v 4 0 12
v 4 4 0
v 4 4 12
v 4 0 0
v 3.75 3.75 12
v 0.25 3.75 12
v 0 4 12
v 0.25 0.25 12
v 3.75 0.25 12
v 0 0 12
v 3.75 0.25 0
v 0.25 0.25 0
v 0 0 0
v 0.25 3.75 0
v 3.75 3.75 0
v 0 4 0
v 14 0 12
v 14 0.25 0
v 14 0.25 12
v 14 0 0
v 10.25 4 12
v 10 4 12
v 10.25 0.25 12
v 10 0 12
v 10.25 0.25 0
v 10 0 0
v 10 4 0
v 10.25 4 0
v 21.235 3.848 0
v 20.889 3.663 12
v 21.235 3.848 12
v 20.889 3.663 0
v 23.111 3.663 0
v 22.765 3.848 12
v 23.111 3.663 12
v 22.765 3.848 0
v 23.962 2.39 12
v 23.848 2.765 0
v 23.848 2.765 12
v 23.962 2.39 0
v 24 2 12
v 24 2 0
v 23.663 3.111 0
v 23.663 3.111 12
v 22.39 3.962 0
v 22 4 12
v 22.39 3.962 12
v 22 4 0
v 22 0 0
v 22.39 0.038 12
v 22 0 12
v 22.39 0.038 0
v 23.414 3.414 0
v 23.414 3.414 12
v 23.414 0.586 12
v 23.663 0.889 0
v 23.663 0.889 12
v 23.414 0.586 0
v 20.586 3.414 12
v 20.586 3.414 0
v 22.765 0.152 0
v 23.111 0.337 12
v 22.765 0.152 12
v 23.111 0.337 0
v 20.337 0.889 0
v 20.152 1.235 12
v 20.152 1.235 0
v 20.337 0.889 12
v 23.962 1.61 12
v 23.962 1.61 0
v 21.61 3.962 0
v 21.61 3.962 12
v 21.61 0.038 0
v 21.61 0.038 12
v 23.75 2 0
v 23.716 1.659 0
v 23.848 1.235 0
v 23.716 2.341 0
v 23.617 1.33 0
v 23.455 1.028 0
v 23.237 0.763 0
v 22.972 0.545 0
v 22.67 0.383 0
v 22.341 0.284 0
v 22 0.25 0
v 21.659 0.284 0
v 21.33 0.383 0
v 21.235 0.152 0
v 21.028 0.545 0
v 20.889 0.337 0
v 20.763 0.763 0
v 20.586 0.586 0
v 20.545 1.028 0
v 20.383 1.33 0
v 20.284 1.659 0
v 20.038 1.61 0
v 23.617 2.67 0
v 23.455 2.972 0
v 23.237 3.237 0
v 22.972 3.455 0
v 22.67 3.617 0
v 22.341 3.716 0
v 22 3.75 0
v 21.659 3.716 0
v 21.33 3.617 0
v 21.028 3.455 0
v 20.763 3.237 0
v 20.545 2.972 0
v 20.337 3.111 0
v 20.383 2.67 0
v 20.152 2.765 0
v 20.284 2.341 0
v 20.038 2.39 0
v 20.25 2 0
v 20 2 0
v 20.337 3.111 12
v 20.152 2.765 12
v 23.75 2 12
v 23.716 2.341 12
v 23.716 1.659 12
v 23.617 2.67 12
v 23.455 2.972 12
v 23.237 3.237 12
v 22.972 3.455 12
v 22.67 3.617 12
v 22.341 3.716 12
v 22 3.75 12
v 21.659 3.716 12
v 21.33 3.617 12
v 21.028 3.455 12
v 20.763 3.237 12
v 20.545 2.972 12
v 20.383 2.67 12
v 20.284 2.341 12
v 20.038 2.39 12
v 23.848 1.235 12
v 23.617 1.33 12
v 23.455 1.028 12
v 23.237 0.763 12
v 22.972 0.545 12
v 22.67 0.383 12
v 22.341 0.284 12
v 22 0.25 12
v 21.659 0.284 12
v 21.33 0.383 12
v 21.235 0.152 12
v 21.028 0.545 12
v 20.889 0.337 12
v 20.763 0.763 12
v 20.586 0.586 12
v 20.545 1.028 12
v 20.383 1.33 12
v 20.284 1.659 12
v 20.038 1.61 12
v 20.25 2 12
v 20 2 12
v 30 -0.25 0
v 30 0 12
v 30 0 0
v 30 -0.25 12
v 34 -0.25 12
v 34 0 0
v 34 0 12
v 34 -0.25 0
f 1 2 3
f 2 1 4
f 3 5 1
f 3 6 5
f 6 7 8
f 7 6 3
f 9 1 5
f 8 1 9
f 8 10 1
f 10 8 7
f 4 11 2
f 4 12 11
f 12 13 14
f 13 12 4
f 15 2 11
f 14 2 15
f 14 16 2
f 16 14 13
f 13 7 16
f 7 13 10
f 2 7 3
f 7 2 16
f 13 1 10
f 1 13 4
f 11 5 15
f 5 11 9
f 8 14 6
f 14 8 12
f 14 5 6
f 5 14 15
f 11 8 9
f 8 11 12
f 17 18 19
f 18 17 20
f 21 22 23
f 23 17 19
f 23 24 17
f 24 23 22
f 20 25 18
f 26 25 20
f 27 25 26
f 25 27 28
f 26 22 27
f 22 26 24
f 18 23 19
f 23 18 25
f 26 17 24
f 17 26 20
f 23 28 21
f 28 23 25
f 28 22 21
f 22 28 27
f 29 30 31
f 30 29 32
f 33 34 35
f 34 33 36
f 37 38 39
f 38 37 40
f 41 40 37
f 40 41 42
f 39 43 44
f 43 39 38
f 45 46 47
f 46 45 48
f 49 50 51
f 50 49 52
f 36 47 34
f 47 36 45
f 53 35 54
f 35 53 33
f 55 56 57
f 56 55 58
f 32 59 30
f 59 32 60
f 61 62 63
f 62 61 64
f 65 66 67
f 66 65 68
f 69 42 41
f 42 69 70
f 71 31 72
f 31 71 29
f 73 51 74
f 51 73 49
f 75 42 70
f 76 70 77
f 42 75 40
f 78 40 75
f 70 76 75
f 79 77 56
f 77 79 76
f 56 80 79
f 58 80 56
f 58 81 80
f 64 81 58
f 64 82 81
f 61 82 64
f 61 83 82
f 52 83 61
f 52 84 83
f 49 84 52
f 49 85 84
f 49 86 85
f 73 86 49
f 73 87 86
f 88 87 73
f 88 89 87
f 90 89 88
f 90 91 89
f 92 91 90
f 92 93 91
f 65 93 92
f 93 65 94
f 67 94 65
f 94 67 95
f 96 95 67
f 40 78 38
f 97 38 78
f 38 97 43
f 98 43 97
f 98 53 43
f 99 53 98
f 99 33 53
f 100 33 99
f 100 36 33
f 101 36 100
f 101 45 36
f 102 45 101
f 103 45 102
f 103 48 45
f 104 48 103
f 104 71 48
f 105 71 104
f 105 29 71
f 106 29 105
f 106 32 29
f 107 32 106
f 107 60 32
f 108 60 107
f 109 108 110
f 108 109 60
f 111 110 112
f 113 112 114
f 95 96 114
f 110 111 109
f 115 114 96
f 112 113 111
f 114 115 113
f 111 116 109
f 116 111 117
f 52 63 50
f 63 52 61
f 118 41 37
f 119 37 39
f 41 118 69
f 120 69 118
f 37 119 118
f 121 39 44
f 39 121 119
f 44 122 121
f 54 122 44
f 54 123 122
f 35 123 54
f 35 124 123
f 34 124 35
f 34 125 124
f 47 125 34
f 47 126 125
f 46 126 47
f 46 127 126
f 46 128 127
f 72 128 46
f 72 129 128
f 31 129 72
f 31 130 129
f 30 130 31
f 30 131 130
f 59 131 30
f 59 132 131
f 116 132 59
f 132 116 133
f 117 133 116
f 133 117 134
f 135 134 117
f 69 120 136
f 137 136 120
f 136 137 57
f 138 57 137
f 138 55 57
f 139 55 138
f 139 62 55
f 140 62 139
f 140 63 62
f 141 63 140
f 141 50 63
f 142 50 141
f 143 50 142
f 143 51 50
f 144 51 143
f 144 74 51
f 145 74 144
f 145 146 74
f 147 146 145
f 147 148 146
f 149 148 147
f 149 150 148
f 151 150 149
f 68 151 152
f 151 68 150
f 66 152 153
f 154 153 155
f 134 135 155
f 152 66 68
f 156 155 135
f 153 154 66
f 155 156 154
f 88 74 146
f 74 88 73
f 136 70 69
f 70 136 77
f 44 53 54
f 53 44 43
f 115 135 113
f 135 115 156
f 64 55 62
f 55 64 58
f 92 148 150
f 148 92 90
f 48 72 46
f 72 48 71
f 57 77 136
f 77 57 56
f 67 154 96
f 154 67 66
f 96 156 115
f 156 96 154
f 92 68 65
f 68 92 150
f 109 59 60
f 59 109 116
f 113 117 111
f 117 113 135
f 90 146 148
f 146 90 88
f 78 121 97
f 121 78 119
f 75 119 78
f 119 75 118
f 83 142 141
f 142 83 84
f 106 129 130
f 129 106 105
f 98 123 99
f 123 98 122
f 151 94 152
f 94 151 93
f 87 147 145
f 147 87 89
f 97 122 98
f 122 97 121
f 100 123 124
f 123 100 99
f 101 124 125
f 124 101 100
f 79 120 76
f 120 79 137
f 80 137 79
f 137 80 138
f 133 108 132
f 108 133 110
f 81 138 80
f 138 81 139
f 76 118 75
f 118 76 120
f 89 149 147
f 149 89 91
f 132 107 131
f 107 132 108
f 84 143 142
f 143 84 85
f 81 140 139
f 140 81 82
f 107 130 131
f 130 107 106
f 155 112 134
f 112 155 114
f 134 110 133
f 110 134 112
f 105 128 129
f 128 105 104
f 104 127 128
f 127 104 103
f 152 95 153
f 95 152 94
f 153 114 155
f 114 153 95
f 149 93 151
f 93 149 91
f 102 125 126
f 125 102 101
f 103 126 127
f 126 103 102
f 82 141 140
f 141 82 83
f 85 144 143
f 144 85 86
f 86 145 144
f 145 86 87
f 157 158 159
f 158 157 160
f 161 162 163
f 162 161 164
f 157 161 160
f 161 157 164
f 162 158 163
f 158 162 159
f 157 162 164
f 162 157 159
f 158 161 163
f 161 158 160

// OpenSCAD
module rectangularTube(height, width, length, thickness) {
    difference()
    {
        cube([height, width, length]);
        translate([thickness, thickness, 0]) {
            cube([height - 2*thickness, width - 2*thickness, length]);
        };
    }
};

module angleIron(height, width, length, thickness) {
    union()
    {
        cube([height, thickness, length]);
        rotate([0, -90, 0]) {
            translate([0, 0, -1 * thickness]) {
                cube([length, width, thickness]);
            }
        }
    }
}

module tube(outer, thickness, length) {
    outerRadius = outer / 2;
    innerRadius = outerRadius - thickness;
    difference() {
        cylinder(length, outerRadius, outerRadius, $fn=32);
        cylinder(length, innerRadius, innerRadius, $fn=32);
    }

}

module flatBar(thickness, width, length) {
    cube([width, length, thickness]);
}


rectangularTube(4, 4, 12, .25);

translate([ 10, 0, 0]) {
    angleIron( 4, 4, 12, .25);
}

translate([ 22, 2, 0]) {
    tube(4, .25, 12);
}

translate([ 30, 0, 0]) {
    rotate([90, 0, 0]) {
        flatBar(.25, 4, 12);
    }
}
